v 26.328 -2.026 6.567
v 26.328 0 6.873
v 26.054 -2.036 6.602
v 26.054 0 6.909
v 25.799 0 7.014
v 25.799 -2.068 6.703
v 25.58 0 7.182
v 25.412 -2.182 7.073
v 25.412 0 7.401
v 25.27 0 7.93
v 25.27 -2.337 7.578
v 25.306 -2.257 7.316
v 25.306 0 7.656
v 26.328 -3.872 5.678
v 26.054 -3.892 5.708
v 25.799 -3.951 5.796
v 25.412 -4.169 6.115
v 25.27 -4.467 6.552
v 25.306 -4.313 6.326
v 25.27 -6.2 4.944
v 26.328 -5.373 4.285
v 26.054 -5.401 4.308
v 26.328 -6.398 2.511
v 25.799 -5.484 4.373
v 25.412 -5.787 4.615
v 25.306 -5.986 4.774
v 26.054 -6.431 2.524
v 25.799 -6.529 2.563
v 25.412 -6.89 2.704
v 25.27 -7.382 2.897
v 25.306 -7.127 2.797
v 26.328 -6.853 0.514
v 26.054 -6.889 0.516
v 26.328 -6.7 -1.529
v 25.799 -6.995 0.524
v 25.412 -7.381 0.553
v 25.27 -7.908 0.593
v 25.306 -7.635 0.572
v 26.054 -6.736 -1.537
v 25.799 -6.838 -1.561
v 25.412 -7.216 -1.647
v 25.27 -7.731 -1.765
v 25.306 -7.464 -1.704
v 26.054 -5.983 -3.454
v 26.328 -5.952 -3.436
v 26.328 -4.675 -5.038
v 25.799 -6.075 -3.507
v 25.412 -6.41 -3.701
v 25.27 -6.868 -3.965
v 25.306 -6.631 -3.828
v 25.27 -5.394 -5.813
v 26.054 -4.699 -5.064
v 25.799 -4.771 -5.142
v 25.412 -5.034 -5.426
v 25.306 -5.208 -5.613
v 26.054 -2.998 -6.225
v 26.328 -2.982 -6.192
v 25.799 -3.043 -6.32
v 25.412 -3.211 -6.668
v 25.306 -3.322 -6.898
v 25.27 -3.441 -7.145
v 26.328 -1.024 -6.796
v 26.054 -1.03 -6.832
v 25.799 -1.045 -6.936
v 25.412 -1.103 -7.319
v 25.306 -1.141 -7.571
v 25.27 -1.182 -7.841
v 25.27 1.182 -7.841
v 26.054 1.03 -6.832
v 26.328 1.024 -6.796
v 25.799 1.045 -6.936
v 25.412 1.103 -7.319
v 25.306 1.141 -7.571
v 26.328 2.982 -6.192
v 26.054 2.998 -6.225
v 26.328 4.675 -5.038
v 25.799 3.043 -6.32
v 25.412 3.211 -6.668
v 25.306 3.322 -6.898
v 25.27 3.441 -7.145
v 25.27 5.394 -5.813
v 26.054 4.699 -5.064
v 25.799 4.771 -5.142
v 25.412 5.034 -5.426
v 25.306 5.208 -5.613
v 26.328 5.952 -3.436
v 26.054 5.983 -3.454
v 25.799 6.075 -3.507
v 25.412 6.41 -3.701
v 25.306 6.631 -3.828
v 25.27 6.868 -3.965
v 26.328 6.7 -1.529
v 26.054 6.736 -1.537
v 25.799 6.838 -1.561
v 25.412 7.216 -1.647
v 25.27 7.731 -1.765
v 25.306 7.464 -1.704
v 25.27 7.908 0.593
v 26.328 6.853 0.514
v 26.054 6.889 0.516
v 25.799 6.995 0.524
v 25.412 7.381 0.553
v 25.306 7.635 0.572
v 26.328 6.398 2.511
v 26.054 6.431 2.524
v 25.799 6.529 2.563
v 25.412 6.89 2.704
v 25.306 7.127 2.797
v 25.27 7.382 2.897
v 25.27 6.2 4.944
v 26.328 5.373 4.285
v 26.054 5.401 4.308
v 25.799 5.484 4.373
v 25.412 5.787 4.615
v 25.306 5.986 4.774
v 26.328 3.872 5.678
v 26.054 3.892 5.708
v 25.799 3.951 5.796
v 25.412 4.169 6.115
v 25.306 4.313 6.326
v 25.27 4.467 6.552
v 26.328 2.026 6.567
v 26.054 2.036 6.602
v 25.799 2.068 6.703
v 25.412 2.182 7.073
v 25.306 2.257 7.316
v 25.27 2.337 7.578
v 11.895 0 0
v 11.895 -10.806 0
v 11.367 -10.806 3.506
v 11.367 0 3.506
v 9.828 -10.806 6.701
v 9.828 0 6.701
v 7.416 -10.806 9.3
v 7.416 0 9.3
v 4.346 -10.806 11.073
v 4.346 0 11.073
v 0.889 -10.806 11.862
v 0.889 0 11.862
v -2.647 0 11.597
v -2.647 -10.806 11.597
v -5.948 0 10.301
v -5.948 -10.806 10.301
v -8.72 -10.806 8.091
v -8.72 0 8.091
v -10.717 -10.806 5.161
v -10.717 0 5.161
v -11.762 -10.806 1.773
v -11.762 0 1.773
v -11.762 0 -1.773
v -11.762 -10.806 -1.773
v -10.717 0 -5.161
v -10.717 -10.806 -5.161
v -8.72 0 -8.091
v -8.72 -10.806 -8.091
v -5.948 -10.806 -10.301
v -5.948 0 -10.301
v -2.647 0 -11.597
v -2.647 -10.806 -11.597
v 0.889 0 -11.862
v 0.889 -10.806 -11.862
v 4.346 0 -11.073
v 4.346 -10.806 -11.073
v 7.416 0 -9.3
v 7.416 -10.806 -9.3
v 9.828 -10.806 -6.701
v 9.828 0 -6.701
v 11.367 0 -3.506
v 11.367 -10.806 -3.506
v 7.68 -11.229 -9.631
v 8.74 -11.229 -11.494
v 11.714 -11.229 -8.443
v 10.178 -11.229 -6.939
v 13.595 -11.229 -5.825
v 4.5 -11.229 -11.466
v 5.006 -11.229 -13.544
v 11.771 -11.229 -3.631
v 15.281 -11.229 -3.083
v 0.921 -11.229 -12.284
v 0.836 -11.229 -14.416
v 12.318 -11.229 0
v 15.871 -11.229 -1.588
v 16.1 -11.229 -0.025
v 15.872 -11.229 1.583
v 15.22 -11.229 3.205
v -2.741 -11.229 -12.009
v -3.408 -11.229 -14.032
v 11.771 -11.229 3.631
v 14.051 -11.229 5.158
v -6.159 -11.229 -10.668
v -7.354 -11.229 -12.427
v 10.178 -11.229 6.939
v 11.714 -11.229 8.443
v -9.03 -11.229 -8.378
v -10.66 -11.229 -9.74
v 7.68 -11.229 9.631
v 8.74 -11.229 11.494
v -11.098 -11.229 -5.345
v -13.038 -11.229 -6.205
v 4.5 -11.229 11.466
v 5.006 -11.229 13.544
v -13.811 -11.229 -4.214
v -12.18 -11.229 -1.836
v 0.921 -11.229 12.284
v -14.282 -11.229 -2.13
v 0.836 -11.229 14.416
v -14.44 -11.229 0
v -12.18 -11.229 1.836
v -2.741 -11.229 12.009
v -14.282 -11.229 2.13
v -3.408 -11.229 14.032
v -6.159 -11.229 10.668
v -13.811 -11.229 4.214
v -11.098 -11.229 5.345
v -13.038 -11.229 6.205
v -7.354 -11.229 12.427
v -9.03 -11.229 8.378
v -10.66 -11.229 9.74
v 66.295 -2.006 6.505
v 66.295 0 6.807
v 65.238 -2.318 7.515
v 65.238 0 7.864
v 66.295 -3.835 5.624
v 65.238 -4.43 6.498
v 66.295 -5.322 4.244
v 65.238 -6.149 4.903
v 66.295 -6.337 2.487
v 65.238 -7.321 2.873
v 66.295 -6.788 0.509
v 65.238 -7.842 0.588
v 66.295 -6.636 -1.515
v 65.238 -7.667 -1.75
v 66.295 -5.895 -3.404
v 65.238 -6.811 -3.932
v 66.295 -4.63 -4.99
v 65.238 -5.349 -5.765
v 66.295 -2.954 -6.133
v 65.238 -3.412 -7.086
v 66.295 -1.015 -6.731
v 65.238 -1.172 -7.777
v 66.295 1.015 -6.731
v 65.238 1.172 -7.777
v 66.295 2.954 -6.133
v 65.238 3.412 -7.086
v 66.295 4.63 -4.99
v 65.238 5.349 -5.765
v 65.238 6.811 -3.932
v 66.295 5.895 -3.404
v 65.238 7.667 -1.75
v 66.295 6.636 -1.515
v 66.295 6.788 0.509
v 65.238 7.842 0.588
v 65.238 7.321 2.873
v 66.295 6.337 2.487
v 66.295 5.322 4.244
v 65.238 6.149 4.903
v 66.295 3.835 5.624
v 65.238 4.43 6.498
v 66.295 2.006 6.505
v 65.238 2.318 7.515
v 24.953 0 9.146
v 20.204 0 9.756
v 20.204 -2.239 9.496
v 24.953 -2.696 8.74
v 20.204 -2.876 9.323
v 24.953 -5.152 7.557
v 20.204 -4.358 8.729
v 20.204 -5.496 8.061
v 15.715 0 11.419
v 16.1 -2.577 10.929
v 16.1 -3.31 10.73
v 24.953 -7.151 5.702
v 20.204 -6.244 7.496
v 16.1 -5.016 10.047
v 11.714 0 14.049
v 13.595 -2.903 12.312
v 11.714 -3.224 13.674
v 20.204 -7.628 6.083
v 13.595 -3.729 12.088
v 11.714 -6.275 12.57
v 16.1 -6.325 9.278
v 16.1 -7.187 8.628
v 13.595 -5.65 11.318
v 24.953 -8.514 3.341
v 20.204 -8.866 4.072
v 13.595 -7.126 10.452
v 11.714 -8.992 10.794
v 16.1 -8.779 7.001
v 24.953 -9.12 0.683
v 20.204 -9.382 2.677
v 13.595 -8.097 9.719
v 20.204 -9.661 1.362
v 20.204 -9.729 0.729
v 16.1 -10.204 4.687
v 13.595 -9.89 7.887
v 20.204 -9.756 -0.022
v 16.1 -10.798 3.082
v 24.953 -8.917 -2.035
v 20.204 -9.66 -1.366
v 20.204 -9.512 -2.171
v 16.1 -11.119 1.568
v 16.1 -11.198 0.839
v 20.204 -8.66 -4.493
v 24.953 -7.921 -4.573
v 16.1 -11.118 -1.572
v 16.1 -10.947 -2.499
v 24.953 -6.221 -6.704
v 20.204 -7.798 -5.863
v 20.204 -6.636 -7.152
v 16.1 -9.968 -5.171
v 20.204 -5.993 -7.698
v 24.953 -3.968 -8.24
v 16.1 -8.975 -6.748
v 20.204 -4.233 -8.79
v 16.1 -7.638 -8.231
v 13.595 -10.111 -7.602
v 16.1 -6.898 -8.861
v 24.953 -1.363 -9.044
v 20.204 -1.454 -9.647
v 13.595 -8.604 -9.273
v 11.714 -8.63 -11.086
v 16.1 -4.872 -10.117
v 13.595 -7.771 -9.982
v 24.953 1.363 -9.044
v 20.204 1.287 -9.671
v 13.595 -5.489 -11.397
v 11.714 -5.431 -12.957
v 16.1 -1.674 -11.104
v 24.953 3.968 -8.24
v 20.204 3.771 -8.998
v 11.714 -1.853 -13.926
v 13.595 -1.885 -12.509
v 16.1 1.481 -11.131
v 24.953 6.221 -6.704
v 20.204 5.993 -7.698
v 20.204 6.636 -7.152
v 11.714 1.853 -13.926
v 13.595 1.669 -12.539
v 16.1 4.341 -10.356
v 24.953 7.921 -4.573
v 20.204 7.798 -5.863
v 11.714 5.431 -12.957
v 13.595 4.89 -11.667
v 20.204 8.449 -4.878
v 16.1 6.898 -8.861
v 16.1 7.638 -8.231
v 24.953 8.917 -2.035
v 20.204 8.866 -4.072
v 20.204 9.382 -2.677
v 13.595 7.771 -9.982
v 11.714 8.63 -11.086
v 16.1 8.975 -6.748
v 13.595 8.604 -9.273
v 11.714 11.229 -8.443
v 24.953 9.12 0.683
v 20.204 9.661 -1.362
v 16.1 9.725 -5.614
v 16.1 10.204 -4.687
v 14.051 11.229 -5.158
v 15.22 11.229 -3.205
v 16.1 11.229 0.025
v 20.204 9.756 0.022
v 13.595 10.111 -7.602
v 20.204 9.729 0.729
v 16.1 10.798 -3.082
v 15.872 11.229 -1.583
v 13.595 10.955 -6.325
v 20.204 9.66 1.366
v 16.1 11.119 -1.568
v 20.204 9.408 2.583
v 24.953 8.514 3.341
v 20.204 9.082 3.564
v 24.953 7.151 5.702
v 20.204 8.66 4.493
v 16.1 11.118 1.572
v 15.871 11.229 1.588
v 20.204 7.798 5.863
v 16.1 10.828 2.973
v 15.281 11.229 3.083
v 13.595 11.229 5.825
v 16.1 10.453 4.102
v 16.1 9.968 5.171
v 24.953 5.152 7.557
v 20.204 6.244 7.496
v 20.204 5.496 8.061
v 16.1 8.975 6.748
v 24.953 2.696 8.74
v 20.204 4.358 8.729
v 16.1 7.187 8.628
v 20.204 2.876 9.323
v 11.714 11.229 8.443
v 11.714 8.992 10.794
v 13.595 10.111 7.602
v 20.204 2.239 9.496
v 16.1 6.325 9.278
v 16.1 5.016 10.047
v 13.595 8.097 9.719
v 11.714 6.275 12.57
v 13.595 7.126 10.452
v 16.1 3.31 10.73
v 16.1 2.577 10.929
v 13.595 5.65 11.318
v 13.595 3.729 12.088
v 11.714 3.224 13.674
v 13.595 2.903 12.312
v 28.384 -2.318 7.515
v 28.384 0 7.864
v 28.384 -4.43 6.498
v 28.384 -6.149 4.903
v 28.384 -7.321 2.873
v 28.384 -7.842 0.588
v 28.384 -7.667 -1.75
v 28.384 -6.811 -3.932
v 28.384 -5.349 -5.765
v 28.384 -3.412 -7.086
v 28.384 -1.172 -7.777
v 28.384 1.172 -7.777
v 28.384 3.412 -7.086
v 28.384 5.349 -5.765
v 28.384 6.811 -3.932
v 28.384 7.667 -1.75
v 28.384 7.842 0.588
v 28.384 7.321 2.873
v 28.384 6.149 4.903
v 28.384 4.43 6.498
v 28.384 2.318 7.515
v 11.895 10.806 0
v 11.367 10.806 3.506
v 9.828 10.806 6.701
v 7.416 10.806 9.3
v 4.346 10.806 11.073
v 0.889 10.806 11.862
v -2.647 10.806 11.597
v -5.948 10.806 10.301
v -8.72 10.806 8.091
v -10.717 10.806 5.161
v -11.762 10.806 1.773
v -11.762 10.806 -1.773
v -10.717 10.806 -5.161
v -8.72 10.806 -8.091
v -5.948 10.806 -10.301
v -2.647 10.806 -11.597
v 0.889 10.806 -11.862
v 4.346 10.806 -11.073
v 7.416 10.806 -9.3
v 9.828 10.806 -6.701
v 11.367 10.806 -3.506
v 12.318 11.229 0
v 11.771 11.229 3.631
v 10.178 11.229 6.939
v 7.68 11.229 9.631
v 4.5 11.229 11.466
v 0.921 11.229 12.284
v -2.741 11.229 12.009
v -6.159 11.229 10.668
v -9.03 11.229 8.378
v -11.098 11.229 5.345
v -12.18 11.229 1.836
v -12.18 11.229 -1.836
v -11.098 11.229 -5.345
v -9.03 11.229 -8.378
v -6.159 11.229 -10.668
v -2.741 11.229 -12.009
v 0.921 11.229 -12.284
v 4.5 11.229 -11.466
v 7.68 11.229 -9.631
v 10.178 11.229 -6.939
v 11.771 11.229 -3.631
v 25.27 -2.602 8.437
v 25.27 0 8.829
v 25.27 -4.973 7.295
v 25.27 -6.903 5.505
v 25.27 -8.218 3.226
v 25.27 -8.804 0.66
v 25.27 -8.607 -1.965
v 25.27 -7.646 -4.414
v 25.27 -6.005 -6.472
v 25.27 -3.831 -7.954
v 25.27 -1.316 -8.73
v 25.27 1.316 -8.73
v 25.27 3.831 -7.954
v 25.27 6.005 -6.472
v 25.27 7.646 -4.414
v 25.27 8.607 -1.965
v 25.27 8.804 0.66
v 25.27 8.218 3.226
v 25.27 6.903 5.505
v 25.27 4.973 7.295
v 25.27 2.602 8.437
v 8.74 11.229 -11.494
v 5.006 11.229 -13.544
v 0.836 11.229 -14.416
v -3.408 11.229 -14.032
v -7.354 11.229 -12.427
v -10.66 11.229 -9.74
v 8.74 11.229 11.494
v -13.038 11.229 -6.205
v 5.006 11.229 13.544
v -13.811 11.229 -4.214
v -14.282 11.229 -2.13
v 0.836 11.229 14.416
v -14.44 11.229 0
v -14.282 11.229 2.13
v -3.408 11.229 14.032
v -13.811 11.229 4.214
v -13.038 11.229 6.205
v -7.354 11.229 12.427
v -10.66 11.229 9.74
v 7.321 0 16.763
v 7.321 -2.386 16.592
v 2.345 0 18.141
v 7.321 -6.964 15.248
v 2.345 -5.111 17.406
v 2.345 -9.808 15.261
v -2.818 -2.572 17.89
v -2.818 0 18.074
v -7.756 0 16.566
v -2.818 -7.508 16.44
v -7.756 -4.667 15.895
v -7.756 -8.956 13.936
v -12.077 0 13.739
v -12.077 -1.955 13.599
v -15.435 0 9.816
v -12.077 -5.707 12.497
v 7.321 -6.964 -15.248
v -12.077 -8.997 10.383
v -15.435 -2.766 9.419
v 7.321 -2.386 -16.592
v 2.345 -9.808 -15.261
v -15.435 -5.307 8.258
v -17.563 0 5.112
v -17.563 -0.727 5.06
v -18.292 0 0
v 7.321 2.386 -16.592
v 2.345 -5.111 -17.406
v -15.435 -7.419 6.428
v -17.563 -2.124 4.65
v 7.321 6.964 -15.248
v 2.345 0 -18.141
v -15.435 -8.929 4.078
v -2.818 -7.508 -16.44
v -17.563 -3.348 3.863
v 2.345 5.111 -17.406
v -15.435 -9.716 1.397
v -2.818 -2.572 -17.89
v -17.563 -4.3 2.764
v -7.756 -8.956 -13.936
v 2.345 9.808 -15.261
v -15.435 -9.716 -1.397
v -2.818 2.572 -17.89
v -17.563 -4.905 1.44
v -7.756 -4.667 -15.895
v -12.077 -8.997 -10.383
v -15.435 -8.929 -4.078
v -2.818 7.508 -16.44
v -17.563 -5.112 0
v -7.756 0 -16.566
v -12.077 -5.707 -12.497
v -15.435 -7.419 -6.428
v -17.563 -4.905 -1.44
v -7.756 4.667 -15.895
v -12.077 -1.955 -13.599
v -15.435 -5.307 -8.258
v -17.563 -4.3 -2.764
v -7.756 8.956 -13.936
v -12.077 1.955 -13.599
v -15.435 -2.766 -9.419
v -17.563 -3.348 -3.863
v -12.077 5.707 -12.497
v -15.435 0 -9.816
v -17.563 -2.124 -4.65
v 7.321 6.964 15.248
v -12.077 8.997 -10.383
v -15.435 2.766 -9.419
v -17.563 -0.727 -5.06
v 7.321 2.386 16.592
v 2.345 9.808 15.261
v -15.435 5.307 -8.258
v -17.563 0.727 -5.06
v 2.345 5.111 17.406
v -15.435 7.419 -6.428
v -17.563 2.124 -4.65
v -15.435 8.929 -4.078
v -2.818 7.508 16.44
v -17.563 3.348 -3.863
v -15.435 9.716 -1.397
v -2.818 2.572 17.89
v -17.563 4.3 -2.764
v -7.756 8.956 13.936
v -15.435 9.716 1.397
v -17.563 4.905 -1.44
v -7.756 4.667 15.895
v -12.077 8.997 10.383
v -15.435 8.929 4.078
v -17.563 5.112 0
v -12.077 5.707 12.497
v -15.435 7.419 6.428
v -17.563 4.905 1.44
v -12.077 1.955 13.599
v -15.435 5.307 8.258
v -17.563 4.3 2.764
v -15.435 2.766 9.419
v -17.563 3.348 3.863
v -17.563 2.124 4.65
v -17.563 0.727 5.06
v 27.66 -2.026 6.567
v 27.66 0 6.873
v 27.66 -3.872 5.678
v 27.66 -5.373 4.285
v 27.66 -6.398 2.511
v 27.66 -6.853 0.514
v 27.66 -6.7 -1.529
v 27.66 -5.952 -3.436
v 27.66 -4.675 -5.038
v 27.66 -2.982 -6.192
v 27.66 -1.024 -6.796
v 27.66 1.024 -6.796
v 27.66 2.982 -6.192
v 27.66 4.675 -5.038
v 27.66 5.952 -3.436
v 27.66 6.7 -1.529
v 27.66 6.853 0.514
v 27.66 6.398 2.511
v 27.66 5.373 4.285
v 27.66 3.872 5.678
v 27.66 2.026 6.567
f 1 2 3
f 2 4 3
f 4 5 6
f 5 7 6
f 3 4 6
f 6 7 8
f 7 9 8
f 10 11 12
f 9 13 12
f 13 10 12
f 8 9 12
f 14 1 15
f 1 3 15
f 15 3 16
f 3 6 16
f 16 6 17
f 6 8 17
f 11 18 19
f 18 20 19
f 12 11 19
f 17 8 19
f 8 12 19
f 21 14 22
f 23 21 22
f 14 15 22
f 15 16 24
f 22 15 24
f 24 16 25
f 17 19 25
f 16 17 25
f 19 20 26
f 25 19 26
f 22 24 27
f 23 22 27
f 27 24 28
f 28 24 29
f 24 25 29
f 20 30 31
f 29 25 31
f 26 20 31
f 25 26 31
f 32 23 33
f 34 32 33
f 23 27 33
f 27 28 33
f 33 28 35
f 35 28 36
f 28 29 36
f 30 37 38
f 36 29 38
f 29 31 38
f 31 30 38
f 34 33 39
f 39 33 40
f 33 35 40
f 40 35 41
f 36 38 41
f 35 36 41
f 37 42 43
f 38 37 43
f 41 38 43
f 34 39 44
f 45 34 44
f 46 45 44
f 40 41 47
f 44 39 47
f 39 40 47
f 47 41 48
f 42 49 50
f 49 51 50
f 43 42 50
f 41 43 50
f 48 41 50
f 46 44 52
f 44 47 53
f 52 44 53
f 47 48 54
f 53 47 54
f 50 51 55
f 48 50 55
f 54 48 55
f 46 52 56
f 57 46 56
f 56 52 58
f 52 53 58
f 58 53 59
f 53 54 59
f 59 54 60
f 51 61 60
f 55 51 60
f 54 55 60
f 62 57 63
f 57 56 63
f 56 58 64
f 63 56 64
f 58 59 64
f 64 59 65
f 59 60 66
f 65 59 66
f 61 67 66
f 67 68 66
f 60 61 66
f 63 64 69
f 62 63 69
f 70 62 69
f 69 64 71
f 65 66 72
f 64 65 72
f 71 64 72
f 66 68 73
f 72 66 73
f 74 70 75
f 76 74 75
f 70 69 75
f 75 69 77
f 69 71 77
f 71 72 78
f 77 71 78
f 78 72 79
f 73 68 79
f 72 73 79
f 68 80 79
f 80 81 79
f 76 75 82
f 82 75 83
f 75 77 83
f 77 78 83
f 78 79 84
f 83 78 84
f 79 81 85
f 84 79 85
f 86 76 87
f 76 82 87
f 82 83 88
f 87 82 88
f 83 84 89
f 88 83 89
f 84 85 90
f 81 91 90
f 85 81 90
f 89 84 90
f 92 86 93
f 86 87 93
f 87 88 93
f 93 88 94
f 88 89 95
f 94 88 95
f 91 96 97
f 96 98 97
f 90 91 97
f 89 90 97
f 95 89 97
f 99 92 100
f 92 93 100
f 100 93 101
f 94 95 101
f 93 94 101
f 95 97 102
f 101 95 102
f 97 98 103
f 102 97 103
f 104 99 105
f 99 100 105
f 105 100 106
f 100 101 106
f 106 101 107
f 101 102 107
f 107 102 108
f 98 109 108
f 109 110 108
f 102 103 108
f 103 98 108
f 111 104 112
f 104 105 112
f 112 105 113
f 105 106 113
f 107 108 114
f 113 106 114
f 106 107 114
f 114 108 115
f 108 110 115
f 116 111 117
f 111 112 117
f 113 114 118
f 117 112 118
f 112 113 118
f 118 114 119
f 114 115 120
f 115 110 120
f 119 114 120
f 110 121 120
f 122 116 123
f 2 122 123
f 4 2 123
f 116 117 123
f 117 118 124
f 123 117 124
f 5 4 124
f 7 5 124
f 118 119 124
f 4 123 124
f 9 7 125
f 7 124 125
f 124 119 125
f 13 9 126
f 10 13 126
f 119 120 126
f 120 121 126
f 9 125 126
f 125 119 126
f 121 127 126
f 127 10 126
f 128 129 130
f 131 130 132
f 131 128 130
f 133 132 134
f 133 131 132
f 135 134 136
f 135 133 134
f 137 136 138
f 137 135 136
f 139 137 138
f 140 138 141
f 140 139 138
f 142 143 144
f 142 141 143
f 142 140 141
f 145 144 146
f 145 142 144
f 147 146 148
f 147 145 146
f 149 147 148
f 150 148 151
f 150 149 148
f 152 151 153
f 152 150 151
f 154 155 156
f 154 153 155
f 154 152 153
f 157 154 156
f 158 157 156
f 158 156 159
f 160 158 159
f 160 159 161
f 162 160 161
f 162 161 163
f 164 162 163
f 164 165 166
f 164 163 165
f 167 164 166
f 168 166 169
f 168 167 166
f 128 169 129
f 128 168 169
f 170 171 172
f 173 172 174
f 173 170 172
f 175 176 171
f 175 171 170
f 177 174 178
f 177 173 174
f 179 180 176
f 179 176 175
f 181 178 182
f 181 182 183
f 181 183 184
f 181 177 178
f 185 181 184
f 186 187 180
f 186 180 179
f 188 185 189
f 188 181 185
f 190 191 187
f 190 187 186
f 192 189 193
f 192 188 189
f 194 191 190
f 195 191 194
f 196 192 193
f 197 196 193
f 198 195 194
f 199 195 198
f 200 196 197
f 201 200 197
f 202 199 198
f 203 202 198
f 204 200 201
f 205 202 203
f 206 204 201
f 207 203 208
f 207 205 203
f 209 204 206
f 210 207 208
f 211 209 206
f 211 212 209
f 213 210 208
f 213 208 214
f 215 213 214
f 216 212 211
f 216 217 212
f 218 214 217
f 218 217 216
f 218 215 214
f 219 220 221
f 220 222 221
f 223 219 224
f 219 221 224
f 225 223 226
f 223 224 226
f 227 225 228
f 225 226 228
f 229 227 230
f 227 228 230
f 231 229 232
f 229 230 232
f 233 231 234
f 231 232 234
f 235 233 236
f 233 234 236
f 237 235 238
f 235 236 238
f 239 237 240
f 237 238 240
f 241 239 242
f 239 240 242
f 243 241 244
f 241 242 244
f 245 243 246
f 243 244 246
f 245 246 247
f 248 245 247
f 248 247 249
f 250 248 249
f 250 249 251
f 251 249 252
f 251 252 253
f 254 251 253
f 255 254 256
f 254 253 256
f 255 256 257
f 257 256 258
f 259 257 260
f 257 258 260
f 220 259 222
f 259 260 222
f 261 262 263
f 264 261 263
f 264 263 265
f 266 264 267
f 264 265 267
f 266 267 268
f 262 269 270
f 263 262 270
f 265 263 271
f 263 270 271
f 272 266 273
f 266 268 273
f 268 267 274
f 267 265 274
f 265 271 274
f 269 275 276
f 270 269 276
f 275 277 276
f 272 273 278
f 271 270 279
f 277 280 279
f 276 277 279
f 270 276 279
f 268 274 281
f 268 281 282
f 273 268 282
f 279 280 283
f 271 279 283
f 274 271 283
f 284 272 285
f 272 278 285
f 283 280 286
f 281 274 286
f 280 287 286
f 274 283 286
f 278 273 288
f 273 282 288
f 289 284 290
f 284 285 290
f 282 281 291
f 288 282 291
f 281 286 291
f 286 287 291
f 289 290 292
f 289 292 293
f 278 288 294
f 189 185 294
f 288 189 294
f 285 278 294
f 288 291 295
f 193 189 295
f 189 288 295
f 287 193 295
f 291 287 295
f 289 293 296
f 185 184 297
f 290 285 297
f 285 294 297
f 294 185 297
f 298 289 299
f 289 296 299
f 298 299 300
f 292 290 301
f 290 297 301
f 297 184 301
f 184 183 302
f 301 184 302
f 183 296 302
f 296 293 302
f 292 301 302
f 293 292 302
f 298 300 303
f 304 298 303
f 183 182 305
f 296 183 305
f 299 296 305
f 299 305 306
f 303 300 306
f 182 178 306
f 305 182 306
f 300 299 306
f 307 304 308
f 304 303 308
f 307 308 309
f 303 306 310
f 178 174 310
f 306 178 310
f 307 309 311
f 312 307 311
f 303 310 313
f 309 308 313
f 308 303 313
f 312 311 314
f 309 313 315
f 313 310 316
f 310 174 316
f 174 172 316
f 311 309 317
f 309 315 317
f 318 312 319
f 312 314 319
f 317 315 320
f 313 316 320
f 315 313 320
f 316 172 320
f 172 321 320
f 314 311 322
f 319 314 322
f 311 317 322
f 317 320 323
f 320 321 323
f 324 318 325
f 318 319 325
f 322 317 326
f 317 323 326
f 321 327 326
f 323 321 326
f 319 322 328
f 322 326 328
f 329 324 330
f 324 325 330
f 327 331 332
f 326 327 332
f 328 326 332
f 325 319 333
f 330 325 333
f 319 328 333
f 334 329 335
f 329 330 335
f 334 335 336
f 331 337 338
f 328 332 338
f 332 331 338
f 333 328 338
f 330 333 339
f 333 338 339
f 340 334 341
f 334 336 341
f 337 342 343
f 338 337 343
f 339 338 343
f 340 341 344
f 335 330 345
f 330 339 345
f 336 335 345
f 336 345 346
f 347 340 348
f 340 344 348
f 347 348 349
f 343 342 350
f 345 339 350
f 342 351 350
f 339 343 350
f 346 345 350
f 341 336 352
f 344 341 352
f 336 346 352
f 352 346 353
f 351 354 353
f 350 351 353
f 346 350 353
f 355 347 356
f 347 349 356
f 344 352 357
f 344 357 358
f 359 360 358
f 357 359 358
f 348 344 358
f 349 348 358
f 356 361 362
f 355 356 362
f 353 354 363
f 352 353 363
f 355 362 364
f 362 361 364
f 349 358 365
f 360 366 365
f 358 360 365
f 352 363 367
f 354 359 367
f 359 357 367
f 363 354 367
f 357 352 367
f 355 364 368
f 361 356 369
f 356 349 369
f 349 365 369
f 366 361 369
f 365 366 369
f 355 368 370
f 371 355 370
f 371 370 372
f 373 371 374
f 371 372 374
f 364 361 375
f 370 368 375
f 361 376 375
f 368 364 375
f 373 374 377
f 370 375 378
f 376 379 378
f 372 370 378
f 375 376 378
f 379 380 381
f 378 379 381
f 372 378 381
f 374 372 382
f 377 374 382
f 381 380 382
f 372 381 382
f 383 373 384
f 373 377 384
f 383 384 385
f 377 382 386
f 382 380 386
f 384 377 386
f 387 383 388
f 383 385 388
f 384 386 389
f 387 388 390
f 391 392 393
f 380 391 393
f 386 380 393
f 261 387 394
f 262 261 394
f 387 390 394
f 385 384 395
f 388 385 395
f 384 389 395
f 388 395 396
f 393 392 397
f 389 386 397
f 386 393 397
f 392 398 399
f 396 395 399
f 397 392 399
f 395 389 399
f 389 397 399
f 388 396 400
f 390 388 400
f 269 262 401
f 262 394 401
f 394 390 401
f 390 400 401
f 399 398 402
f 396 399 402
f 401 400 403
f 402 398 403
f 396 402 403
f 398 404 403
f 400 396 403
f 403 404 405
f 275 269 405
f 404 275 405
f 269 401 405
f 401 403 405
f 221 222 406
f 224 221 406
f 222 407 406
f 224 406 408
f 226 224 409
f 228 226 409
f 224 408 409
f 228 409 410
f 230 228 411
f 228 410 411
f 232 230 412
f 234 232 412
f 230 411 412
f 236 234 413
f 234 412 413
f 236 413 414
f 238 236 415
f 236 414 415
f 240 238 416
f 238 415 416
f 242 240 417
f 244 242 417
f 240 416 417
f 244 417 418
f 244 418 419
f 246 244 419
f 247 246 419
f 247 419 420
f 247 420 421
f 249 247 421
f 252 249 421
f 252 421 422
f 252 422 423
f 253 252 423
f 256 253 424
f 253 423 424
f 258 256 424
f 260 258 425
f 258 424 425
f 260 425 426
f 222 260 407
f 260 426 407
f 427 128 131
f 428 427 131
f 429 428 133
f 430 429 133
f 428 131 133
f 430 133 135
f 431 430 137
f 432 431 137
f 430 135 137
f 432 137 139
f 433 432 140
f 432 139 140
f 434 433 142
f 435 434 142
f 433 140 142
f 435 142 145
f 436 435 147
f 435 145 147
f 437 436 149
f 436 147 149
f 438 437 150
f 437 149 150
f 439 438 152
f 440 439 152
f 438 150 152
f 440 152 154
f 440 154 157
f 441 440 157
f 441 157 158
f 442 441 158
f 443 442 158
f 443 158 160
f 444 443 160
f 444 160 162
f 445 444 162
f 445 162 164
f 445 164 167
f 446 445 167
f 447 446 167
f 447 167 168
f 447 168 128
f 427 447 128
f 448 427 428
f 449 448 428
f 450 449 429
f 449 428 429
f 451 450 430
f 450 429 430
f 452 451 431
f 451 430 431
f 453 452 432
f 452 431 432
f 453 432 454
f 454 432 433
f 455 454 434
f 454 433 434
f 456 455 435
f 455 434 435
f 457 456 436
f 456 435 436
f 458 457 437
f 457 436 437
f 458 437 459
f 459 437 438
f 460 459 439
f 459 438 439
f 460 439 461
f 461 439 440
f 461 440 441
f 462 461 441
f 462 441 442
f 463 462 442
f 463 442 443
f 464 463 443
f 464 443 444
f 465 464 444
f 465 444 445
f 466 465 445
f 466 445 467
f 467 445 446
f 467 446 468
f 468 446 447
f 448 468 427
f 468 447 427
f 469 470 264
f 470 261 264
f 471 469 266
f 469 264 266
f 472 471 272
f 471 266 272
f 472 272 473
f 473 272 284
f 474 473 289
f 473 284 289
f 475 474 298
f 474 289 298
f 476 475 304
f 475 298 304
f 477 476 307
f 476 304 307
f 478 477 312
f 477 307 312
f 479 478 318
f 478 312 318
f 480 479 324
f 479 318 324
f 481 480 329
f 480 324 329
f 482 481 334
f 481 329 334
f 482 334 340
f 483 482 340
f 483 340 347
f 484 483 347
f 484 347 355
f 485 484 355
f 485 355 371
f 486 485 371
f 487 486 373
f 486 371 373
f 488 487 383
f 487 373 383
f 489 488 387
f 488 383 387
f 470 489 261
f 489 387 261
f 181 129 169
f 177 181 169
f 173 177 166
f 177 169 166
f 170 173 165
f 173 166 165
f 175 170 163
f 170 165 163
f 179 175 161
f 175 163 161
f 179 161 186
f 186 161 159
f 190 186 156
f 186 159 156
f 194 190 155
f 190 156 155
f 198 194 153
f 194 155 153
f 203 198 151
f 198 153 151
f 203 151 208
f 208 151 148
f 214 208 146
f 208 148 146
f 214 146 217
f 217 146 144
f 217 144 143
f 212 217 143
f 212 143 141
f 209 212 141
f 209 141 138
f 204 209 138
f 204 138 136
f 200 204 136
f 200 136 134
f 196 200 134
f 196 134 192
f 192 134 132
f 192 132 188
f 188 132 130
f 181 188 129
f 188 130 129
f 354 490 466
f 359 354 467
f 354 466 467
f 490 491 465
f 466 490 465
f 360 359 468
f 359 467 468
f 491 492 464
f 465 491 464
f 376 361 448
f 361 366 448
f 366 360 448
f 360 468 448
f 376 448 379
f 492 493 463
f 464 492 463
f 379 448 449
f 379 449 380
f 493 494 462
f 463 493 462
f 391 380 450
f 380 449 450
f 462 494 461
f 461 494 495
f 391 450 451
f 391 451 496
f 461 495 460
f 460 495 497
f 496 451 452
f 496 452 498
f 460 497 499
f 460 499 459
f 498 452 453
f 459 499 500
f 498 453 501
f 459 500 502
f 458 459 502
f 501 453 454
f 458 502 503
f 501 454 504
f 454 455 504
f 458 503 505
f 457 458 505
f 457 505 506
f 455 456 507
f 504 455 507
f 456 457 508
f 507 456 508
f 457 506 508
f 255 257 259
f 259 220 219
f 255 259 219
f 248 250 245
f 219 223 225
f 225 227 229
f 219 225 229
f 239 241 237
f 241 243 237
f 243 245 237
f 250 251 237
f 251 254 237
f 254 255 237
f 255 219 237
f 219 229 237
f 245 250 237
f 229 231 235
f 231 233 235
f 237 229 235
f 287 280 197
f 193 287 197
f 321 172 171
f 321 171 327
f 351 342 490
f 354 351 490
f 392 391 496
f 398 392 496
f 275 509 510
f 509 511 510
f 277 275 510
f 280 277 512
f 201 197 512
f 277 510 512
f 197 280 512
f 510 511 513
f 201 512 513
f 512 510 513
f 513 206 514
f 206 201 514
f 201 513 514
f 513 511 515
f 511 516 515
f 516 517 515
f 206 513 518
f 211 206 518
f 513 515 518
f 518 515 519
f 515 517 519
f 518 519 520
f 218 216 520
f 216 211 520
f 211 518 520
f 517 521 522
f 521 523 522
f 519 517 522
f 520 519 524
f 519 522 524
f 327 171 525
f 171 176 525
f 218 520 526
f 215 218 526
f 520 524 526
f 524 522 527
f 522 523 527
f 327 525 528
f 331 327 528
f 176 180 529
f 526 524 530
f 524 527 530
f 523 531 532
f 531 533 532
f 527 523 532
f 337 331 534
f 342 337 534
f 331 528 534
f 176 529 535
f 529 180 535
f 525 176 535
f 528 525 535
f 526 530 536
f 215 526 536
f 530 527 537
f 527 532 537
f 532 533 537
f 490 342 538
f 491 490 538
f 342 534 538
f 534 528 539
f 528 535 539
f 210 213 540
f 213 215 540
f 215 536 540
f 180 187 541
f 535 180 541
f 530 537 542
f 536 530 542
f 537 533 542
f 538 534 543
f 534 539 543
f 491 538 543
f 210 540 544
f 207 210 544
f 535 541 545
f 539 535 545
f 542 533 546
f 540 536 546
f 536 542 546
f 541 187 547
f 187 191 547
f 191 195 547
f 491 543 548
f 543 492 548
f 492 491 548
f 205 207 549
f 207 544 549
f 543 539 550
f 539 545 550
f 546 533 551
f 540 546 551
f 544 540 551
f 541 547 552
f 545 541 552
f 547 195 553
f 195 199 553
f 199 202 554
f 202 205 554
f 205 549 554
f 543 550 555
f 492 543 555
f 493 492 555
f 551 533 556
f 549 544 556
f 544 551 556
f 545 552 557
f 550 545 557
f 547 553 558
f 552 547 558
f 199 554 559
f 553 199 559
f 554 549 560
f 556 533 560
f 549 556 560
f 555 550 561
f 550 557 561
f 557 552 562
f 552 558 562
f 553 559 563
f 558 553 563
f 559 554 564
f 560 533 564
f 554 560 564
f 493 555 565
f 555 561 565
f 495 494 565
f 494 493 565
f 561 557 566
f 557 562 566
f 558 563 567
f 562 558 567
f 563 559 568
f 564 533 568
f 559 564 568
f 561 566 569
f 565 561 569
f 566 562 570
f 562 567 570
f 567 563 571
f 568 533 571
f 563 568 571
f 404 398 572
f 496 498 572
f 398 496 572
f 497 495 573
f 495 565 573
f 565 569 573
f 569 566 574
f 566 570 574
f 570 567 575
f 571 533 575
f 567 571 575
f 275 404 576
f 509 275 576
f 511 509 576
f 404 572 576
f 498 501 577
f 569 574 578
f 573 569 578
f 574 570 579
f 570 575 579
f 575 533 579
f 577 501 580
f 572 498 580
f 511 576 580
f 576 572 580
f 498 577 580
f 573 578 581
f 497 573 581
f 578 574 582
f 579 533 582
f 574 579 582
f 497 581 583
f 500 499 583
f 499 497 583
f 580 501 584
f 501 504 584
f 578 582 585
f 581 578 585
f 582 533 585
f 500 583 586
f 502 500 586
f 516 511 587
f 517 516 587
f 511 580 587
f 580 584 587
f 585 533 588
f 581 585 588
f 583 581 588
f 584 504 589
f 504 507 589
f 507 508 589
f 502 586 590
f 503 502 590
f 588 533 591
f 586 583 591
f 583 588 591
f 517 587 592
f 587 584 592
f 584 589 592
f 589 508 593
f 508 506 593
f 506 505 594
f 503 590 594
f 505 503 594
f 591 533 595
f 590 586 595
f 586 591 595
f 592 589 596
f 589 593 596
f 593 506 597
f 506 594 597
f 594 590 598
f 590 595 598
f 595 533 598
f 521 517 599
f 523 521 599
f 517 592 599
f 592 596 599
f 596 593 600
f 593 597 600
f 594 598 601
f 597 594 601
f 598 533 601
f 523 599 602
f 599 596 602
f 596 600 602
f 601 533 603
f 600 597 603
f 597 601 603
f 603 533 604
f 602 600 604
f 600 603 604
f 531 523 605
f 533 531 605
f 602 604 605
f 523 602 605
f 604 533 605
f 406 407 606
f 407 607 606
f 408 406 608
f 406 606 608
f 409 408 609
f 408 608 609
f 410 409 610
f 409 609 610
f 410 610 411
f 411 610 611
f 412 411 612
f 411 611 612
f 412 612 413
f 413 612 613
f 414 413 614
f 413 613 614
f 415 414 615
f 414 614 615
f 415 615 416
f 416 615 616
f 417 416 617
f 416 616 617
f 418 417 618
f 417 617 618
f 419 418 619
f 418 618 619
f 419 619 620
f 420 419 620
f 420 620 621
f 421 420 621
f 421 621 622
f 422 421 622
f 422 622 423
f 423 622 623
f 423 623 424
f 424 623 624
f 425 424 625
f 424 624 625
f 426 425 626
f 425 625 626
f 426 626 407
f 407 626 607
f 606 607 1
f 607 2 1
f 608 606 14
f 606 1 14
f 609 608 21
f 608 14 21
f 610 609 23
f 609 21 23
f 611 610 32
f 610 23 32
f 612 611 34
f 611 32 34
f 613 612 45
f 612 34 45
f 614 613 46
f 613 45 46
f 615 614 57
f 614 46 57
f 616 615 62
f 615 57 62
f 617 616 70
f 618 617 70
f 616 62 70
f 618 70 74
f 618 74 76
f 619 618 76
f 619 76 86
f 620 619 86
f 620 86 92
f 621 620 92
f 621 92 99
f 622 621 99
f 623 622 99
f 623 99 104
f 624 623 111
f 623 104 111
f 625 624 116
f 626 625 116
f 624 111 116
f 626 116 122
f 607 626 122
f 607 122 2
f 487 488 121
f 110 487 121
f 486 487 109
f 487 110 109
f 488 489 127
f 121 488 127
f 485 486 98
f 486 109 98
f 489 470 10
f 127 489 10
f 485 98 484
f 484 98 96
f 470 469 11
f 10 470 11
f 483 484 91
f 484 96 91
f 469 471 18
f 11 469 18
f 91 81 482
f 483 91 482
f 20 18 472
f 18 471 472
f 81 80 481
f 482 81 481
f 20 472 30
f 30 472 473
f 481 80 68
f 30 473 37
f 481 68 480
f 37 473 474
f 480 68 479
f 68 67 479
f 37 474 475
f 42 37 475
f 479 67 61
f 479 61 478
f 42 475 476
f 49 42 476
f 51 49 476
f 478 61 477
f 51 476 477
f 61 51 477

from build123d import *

# Parameters (mm, degrees)
F2_W          = 230.1748
F2_H          = 279.4
F2_W_2        = 26.9748
F2_H_2        = 76.2
F3_DEPTH      = 21.972
F3_DEPTH_BACK = 79.63
F4_R          = 14.2875
F5_DEPTH      = 13.4884001
F5_DEPTH_BACK = 13.4884001
F6_SIZE       = 0.508
F7_SCALE      = 0.832549


with BuildPart() as f1:
    # F0 (on Front) → F1 (revolve)
    with BuildSketch(Plane.XZ):
        with BuildLine():
            ThreePointArc((29.972, 10.9855), (21.5151525193, 12.5638689957), (14.0702344541, 16.8746360971))
            ThreePointArc((14.0702344541, 16.8746360971), (-9.3163222306, 19.8980145013), (-21.971, 0))
            Line((-21.971, 0), (79.629, 0))
            Line((79.629, 0), (79.629, 8.17626))
            Line((79.629, 8.17626), (78.359, 9.44626))
            Line((78.359, 9.44626), (34.0925209982, 9.44626))
            Line((34.0925209982, 9.44626), (33.2232, 8.255))
            Line((33.2232, 8.255), (31.623, 8.255))
            ThreePointArc((31.623, 8.255), (30.7249743879, 8.6269743879), (30.353, 9.525))
            Line((30.353, 9.525), (30.353, 10.6045))
            Line((30.353, 10.6045), (29.972, 10.9855))
        make_face()
    revolve(axis=Axis((28.829, 0, 0), (1, 0, 0)))

    # F2 (on Right) → F3 (cut, two sides)
    with BuildSketch(Plane.YZ) as f3_sk:
        Rectangle(F2_W, F2_H)
        Rectangle(F2_W_2, F2_H_2, mode=Mode.SUBTRACT)
    extrude(amount=-F3_DEPTH, mode=Mode.SUBTRACT)
    extrude(f3_sk.sketch, amount=F3_DEPTH_BACK, mode=Mode.SUBTRACT)

    # F4 (on Front) → F5 (cut, two sides)
    with BuildSketch(Plane.XZ) as f5_sk:
        Circle(F4_R)
    extrude(amount=-F5_DEPTH, mode=Mode.SUBTRACT)
    extrude(f5_sk.sketch, amount=F5_DEPTH_BACK, mode=Mode.SUBTRACT)

    # F6
    f6_edges = [f1.edges().sort_by_distance(p)[0] for p in [
        (-14.2875, 13.4874, 0),
        (-14.2875, -13.4874, 0),
    ]]
    chamfer(f6_edges, length=F6_SIZE)


with BuildPart() as f1_1:
    # F7: moved
    add(f1.part.scale(F7_SCALE))


solid = f1_1.part
